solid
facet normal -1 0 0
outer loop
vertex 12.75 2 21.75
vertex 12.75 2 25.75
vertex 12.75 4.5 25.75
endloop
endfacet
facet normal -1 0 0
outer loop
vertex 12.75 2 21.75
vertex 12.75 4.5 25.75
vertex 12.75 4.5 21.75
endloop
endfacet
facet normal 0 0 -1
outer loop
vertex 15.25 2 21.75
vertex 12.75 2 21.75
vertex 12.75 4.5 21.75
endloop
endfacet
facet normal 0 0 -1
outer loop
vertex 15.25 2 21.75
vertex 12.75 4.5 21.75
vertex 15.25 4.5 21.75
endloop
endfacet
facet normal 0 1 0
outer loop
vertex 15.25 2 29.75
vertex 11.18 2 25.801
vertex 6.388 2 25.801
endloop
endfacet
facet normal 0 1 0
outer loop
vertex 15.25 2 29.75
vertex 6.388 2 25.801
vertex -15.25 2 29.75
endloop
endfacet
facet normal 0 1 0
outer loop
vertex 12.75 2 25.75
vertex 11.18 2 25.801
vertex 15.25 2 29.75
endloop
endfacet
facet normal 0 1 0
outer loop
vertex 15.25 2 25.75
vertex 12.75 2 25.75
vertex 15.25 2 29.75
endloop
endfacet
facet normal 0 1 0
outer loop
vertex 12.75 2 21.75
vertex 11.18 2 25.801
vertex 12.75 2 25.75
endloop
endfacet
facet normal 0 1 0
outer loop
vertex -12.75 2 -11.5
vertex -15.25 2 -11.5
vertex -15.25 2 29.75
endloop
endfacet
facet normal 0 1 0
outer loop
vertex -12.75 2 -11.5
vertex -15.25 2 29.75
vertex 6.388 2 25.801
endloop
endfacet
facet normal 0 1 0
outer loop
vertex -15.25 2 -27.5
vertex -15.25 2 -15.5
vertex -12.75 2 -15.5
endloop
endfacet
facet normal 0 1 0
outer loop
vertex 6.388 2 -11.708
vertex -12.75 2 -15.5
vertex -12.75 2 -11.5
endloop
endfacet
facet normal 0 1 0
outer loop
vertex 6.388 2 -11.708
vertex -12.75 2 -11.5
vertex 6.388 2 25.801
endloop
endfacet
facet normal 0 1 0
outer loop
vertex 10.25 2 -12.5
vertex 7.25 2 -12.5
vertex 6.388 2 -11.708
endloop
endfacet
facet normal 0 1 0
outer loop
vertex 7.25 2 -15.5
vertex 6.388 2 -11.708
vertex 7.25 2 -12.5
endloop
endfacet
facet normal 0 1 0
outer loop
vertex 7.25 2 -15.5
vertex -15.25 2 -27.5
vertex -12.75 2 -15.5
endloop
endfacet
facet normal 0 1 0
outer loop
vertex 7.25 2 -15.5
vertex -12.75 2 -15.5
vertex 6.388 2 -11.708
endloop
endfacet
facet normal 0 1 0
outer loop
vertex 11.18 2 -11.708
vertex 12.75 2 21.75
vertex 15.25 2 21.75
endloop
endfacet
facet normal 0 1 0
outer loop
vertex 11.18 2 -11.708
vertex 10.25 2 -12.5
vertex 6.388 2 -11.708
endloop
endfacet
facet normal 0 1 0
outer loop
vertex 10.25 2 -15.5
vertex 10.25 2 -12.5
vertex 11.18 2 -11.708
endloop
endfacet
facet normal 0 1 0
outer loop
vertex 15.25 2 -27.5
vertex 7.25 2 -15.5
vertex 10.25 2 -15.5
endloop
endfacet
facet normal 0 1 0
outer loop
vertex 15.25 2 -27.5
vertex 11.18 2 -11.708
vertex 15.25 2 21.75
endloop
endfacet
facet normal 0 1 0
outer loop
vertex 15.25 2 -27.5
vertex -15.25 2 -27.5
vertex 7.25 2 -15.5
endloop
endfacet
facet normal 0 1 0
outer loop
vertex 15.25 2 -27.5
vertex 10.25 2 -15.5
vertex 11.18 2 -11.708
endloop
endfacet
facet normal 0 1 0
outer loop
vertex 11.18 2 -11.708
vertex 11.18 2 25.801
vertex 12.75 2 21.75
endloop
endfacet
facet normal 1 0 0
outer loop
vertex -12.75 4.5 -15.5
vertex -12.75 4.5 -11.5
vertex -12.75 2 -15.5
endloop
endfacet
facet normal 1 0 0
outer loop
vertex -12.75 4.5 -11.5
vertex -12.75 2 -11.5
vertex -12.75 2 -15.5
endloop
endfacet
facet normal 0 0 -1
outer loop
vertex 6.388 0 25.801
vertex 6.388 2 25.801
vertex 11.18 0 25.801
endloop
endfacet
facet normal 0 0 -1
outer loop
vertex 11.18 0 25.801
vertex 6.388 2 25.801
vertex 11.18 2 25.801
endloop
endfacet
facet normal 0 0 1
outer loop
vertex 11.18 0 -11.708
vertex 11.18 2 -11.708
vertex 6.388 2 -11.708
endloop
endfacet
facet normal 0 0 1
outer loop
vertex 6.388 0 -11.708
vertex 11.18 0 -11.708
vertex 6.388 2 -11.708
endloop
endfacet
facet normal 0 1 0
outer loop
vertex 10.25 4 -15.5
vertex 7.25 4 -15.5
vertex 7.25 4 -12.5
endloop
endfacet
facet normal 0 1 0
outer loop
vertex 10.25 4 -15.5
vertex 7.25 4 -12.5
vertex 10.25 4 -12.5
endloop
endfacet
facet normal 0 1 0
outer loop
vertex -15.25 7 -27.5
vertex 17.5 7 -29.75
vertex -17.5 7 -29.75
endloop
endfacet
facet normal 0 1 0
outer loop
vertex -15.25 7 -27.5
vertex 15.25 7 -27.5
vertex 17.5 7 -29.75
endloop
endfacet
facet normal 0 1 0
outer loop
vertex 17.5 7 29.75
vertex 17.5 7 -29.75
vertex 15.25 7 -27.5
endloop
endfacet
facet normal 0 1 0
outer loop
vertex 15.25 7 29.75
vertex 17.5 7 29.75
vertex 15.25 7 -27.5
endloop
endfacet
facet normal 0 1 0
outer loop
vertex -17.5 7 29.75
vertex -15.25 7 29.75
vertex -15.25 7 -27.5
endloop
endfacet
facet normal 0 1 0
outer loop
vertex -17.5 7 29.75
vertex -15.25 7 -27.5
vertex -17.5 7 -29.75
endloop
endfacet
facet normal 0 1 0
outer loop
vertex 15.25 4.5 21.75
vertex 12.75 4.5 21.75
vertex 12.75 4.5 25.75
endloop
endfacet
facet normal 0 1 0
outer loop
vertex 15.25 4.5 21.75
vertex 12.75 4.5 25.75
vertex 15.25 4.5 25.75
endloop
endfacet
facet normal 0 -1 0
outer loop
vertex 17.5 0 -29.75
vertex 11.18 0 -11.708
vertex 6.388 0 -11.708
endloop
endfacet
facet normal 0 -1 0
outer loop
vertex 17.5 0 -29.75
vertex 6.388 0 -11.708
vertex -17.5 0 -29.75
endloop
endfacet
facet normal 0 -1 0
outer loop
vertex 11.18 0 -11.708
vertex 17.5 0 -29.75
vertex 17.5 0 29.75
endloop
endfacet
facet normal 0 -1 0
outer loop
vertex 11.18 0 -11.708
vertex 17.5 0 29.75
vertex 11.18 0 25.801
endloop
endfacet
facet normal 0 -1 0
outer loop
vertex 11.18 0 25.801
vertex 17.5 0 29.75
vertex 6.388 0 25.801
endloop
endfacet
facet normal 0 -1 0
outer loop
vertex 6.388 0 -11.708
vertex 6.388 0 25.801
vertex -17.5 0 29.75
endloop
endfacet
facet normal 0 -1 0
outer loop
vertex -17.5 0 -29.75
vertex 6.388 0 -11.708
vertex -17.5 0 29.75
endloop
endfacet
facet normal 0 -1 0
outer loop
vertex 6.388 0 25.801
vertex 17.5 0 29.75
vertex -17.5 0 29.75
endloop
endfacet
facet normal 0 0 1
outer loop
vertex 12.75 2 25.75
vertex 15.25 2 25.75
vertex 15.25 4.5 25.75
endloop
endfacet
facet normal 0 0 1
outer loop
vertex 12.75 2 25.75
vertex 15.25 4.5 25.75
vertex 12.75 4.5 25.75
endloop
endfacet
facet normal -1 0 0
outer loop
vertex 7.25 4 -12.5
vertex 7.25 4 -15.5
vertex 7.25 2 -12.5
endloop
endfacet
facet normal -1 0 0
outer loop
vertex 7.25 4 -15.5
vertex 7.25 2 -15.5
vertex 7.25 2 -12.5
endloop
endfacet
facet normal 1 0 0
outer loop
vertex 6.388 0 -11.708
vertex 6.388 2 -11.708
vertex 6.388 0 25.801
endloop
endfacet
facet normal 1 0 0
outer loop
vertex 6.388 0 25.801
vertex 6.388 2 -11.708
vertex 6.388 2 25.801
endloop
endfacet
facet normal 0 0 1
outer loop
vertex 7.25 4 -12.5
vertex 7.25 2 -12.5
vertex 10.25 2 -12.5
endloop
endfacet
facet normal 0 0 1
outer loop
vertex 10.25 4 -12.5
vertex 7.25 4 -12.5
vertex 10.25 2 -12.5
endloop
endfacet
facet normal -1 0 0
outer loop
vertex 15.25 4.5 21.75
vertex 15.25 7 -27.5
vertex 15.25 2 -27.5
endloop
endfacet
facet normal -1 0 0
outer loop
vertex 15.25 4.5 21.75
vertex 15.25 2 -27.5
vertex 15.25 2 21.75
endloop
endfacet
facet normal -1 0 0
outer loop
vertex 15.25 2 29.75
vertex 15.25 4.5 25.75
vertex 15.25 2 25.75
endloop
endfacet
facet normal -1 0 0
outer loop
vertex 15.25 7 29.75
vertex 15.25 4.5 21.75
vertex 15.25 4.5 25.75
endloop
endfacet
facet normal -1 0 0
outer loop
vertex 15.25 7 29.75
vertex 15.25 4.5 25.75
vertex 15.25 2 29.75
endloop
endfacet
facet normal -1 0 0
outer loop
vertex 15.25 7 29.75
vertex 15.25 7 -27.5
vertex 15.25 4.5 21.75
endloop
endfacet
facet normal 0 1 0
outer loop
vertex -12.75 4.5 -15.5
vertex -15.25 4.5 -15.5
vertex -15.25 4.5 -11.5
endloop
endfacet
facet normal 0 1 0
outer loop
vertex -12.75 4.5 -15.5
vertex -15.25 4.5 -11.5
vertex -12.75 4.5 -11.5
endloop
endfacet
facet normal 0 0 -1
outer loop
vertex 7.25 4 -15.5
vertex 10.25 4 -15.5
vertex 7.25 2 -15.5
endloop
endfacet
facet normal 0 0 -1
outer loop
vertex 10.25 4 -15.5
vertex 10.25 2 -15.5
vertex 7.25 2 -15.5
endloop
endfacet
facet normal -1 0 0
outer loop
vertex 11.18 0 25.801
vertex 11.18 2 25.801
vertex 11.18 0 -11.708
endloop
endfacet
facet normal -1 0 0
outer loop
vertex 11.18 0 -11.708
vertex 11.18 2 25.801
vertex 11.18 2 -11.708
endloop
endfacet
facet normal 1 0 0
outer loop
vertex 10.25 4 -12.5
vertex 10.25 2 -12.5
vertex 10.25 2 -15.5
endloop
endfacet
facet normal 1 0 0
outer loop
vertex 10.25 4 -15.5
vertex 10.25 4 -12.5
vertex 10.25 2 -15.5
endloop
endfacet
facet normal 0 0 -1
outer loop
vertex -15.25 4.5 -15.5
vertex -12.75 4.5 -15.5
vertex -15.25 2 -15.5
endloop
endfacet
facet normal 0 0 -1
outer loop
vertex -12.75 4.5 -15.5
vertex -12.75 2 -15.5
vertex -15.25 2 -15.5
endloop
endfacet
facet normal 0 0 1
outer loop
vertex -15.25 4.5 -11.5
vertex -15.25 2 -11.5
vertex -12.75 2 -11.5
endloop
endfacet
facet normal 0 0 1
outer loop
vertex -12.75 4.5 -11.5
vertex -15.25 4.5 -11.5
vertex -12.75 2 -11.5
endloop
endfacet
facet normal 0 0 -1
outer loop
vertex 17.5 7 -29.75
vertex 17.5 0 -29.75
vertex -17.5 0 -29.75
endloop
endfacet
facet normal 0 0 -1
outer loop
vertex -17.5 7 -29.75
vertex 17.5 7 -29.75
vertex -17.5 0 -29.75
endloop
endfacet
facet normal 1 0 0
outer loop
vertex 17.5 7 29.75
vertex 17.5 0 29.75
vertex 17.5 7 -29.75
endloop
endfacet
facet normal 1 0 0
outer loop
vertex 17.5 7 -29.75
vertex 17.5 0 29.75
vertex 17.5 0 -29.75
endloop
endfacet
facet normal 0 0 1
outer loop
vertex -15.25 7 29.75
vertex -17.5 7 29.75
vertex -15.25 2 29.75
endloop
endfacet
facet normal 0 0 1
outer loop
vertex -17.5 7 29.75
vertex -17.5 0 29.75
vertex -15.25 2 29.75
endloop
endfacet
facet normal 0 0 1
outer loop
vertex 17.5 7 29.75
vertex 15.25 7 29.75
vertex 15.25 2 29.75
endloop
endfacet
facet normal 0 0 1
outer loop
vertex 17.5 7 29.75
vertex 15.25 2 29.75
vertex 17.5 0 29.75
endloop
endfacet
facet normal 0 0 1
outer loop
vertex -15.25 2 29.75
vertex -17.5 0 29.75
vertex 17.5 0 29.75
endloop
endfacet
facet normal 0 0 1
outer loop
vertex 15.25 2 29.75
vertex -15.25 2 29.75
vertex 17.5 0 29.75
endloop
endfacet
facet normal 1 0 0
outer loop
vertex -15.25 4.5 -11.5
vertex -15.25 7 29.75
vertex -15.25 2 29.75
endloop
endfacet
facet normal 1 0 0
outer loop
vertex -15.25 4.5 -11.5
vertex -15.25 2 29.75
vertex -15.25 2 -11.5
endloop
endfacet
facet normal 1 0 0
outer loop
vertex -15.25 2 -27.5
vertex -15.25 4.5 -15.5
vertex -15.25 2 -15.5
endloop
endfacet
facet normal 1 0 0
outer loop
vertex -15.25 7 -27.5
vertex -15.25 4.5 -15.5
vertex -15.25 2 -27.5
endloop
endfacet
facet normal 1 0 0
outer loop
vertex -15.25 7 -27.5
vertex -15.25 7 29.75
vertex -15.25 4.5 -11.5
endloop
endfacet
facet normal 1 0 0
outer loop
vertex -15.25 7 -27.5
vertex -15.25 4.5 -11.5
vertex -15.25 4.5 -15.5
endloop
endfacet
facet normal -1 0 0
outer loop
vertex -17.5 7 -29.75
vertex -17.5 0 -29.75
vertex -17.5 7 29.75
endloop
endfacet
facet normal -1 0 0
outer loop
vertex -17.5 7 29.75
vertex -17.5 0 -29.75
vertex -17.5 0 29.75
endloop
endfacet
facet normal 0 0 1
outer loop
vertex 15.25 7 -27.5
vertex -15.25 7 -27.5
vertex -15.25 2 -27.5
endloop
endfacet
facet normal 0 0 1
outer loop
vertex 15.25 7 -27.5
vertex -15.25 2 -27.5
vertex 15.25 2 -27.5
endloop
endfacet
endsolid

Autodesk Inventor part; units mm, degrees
ref_plane "YZ Plane" through (0, 0, 0) normal (1, 0, 0) x (0, 1, 0)
ref_plane "XZ Plane" through (0, 0, 0) normal (0, 1, 0) x (-1, 0, 0)
ref_plane "XY Plane" through (0, 0, 0) normal (0, 0, 1) x (1, 0, 0)
sketch "Sketch1" plane through (0, 0, 0) normal (0, 1, 0) x (-1, 0, 0)
  line L0 (-17.5, -29.75) -> (17.5, -29.75)
  line L1 (17.5, -29.75) -> (17.5, 29.75)
  line L2 (17.5, 29.75) -> (-17.5, 29.75)
  line L3 (-17.5, 29.75) -> (-17.5, -29.75)
  line L4 (-17.5, -29.75) -> (17.5, 29.75) construction
  line L5 (17.5, -29.75) -> (-17.5, 29.75) construction
  point P0 (0, 0)
  dimension "d0" = 59.5
  dimension "d1" = 35
extrude "Extrusion1" add sketch "Sketch1" along normal blind 7
sketch "Sketch2" plane through (0, 7, 0) normal (0, 1, 0) x (1, 0, 0)
  line L0 (-17.5, -29.75) -> (17.5, -29.75) projected
  line L1 (15.25, -29.75) -> (-15.25, -29.75)
  line L2 (-15.25, -29.75) -> (-15.25, 27.5)
  line L3 (-15.25, 27.5) -> (15.25, 27.5)
  line L4 (15.25, 27.5) -> (15.25, -29.75)
  line L5 (17.5, -29.75) -> (17.5, 29.75) projected
  line L6 (17.5, 29.75) -> (-17.5, 29.75) projected
  line L7 (-17.5, 29.75) -> (-17.5, -29.75) projected
  point P0 (0, 0)
  point P1 (-15.25, -29.75)
  dimension "d4" = 2.25
  dimension "d5" = 2.25
  dimension "d6" = 2.25
extrude "Extrusion2" cut sketch "Sketch2" against normal blind 5 contours L2 L3 L4 L0
sketch "Sketch3" plane through (0, 2, 0) normal (0, 1, 0) x (1, 0, 0)
  line L0 (10.25, 15.5) -> (7.25, 15.5)
  line L1 (7.25, 15.5) -> (7.25, 12.5)
  line L2 (7.25, 12.5) -> (10.25, 12.5)
  line L3 (10.25, 12.5) -> (10.25, 15.5)
  line L4 (-15.25, 27.5) -> (15.25, 27.5) projected
  line L5 (15.25, 27.5) -> (15.25, -29.75) projected
  line L6 (15.25, -25.75) -> (12.75, -25.75)
  line L7 (12.75, -25.75) -> (12.75, -21.75)
  line L8 (12.75, -21.75) -> (15.25, -21.75)
  line L9 (15.25, -21.75) -> (15.25, -25.75)
  line L10 (-15.25, -29.75) -> (-15.25, 27.5) projected
  line L11 (-15.25, 11.5) -> (-12.75, 11.5)
  line L12 (-12.75, 11.5) -> (-12.75, 15.5)
  line L13 (-12.75, 15.5) -> (-15.25, 15.5)
  line L14 (-15.25, 15.5) -> (-15.25, 11.5)
  line L15 (15.25, -29.75) -> (-15.25, -29.75) projected
  point P0 (0, 0)
  point P1 (15.25, -21.75)
  dimension "d9" = 3
  dimension "d10" = 3
  dimension "d21" = 12
  dimension "d22" = 5
  dimension "d23" = 2.5
  dimension "d24" = 4
  dimension "d25" = 4
  dimension "d26" = 2.5
  dimension "d27" = 12
  dimension "d28" = 4
extrude "Extrusion3" add sketch "Sketch3" along normal blind 2 contours L3 L2 L1 L0
extrude "Extrusion4" add sketch "Sketch3" along normal blind 2.5 contours L13 L12 L11 L10 | L5 L6 L7 L8
sketch "Sketch4" plane through (0, 2, 0) normal (0, 1, 0) x (1, 0, 0)
  line L0 (11.1804, 11.7081) -> (6.3882, 11.7081)
  line L1 (6.3882, 11.7081) -> (6.3882, -25.8012)
  line L2 (6.3882, -25.8012) -> (11.1804, -25.8012)
  line L3 (11.1804, -25.8012) -> (11.1804, 11.7081)
  point P0 (0, 0)
extrude "Extrusion5" cut sketch "Sketch4" against normal through all
equation "\"d5\" = d4"
equation "\"d6\" = d4"
equation "\"d25\" = d24"
equation "\"d26\" = d23"
properties part number "CROC Gluing Form V2"
